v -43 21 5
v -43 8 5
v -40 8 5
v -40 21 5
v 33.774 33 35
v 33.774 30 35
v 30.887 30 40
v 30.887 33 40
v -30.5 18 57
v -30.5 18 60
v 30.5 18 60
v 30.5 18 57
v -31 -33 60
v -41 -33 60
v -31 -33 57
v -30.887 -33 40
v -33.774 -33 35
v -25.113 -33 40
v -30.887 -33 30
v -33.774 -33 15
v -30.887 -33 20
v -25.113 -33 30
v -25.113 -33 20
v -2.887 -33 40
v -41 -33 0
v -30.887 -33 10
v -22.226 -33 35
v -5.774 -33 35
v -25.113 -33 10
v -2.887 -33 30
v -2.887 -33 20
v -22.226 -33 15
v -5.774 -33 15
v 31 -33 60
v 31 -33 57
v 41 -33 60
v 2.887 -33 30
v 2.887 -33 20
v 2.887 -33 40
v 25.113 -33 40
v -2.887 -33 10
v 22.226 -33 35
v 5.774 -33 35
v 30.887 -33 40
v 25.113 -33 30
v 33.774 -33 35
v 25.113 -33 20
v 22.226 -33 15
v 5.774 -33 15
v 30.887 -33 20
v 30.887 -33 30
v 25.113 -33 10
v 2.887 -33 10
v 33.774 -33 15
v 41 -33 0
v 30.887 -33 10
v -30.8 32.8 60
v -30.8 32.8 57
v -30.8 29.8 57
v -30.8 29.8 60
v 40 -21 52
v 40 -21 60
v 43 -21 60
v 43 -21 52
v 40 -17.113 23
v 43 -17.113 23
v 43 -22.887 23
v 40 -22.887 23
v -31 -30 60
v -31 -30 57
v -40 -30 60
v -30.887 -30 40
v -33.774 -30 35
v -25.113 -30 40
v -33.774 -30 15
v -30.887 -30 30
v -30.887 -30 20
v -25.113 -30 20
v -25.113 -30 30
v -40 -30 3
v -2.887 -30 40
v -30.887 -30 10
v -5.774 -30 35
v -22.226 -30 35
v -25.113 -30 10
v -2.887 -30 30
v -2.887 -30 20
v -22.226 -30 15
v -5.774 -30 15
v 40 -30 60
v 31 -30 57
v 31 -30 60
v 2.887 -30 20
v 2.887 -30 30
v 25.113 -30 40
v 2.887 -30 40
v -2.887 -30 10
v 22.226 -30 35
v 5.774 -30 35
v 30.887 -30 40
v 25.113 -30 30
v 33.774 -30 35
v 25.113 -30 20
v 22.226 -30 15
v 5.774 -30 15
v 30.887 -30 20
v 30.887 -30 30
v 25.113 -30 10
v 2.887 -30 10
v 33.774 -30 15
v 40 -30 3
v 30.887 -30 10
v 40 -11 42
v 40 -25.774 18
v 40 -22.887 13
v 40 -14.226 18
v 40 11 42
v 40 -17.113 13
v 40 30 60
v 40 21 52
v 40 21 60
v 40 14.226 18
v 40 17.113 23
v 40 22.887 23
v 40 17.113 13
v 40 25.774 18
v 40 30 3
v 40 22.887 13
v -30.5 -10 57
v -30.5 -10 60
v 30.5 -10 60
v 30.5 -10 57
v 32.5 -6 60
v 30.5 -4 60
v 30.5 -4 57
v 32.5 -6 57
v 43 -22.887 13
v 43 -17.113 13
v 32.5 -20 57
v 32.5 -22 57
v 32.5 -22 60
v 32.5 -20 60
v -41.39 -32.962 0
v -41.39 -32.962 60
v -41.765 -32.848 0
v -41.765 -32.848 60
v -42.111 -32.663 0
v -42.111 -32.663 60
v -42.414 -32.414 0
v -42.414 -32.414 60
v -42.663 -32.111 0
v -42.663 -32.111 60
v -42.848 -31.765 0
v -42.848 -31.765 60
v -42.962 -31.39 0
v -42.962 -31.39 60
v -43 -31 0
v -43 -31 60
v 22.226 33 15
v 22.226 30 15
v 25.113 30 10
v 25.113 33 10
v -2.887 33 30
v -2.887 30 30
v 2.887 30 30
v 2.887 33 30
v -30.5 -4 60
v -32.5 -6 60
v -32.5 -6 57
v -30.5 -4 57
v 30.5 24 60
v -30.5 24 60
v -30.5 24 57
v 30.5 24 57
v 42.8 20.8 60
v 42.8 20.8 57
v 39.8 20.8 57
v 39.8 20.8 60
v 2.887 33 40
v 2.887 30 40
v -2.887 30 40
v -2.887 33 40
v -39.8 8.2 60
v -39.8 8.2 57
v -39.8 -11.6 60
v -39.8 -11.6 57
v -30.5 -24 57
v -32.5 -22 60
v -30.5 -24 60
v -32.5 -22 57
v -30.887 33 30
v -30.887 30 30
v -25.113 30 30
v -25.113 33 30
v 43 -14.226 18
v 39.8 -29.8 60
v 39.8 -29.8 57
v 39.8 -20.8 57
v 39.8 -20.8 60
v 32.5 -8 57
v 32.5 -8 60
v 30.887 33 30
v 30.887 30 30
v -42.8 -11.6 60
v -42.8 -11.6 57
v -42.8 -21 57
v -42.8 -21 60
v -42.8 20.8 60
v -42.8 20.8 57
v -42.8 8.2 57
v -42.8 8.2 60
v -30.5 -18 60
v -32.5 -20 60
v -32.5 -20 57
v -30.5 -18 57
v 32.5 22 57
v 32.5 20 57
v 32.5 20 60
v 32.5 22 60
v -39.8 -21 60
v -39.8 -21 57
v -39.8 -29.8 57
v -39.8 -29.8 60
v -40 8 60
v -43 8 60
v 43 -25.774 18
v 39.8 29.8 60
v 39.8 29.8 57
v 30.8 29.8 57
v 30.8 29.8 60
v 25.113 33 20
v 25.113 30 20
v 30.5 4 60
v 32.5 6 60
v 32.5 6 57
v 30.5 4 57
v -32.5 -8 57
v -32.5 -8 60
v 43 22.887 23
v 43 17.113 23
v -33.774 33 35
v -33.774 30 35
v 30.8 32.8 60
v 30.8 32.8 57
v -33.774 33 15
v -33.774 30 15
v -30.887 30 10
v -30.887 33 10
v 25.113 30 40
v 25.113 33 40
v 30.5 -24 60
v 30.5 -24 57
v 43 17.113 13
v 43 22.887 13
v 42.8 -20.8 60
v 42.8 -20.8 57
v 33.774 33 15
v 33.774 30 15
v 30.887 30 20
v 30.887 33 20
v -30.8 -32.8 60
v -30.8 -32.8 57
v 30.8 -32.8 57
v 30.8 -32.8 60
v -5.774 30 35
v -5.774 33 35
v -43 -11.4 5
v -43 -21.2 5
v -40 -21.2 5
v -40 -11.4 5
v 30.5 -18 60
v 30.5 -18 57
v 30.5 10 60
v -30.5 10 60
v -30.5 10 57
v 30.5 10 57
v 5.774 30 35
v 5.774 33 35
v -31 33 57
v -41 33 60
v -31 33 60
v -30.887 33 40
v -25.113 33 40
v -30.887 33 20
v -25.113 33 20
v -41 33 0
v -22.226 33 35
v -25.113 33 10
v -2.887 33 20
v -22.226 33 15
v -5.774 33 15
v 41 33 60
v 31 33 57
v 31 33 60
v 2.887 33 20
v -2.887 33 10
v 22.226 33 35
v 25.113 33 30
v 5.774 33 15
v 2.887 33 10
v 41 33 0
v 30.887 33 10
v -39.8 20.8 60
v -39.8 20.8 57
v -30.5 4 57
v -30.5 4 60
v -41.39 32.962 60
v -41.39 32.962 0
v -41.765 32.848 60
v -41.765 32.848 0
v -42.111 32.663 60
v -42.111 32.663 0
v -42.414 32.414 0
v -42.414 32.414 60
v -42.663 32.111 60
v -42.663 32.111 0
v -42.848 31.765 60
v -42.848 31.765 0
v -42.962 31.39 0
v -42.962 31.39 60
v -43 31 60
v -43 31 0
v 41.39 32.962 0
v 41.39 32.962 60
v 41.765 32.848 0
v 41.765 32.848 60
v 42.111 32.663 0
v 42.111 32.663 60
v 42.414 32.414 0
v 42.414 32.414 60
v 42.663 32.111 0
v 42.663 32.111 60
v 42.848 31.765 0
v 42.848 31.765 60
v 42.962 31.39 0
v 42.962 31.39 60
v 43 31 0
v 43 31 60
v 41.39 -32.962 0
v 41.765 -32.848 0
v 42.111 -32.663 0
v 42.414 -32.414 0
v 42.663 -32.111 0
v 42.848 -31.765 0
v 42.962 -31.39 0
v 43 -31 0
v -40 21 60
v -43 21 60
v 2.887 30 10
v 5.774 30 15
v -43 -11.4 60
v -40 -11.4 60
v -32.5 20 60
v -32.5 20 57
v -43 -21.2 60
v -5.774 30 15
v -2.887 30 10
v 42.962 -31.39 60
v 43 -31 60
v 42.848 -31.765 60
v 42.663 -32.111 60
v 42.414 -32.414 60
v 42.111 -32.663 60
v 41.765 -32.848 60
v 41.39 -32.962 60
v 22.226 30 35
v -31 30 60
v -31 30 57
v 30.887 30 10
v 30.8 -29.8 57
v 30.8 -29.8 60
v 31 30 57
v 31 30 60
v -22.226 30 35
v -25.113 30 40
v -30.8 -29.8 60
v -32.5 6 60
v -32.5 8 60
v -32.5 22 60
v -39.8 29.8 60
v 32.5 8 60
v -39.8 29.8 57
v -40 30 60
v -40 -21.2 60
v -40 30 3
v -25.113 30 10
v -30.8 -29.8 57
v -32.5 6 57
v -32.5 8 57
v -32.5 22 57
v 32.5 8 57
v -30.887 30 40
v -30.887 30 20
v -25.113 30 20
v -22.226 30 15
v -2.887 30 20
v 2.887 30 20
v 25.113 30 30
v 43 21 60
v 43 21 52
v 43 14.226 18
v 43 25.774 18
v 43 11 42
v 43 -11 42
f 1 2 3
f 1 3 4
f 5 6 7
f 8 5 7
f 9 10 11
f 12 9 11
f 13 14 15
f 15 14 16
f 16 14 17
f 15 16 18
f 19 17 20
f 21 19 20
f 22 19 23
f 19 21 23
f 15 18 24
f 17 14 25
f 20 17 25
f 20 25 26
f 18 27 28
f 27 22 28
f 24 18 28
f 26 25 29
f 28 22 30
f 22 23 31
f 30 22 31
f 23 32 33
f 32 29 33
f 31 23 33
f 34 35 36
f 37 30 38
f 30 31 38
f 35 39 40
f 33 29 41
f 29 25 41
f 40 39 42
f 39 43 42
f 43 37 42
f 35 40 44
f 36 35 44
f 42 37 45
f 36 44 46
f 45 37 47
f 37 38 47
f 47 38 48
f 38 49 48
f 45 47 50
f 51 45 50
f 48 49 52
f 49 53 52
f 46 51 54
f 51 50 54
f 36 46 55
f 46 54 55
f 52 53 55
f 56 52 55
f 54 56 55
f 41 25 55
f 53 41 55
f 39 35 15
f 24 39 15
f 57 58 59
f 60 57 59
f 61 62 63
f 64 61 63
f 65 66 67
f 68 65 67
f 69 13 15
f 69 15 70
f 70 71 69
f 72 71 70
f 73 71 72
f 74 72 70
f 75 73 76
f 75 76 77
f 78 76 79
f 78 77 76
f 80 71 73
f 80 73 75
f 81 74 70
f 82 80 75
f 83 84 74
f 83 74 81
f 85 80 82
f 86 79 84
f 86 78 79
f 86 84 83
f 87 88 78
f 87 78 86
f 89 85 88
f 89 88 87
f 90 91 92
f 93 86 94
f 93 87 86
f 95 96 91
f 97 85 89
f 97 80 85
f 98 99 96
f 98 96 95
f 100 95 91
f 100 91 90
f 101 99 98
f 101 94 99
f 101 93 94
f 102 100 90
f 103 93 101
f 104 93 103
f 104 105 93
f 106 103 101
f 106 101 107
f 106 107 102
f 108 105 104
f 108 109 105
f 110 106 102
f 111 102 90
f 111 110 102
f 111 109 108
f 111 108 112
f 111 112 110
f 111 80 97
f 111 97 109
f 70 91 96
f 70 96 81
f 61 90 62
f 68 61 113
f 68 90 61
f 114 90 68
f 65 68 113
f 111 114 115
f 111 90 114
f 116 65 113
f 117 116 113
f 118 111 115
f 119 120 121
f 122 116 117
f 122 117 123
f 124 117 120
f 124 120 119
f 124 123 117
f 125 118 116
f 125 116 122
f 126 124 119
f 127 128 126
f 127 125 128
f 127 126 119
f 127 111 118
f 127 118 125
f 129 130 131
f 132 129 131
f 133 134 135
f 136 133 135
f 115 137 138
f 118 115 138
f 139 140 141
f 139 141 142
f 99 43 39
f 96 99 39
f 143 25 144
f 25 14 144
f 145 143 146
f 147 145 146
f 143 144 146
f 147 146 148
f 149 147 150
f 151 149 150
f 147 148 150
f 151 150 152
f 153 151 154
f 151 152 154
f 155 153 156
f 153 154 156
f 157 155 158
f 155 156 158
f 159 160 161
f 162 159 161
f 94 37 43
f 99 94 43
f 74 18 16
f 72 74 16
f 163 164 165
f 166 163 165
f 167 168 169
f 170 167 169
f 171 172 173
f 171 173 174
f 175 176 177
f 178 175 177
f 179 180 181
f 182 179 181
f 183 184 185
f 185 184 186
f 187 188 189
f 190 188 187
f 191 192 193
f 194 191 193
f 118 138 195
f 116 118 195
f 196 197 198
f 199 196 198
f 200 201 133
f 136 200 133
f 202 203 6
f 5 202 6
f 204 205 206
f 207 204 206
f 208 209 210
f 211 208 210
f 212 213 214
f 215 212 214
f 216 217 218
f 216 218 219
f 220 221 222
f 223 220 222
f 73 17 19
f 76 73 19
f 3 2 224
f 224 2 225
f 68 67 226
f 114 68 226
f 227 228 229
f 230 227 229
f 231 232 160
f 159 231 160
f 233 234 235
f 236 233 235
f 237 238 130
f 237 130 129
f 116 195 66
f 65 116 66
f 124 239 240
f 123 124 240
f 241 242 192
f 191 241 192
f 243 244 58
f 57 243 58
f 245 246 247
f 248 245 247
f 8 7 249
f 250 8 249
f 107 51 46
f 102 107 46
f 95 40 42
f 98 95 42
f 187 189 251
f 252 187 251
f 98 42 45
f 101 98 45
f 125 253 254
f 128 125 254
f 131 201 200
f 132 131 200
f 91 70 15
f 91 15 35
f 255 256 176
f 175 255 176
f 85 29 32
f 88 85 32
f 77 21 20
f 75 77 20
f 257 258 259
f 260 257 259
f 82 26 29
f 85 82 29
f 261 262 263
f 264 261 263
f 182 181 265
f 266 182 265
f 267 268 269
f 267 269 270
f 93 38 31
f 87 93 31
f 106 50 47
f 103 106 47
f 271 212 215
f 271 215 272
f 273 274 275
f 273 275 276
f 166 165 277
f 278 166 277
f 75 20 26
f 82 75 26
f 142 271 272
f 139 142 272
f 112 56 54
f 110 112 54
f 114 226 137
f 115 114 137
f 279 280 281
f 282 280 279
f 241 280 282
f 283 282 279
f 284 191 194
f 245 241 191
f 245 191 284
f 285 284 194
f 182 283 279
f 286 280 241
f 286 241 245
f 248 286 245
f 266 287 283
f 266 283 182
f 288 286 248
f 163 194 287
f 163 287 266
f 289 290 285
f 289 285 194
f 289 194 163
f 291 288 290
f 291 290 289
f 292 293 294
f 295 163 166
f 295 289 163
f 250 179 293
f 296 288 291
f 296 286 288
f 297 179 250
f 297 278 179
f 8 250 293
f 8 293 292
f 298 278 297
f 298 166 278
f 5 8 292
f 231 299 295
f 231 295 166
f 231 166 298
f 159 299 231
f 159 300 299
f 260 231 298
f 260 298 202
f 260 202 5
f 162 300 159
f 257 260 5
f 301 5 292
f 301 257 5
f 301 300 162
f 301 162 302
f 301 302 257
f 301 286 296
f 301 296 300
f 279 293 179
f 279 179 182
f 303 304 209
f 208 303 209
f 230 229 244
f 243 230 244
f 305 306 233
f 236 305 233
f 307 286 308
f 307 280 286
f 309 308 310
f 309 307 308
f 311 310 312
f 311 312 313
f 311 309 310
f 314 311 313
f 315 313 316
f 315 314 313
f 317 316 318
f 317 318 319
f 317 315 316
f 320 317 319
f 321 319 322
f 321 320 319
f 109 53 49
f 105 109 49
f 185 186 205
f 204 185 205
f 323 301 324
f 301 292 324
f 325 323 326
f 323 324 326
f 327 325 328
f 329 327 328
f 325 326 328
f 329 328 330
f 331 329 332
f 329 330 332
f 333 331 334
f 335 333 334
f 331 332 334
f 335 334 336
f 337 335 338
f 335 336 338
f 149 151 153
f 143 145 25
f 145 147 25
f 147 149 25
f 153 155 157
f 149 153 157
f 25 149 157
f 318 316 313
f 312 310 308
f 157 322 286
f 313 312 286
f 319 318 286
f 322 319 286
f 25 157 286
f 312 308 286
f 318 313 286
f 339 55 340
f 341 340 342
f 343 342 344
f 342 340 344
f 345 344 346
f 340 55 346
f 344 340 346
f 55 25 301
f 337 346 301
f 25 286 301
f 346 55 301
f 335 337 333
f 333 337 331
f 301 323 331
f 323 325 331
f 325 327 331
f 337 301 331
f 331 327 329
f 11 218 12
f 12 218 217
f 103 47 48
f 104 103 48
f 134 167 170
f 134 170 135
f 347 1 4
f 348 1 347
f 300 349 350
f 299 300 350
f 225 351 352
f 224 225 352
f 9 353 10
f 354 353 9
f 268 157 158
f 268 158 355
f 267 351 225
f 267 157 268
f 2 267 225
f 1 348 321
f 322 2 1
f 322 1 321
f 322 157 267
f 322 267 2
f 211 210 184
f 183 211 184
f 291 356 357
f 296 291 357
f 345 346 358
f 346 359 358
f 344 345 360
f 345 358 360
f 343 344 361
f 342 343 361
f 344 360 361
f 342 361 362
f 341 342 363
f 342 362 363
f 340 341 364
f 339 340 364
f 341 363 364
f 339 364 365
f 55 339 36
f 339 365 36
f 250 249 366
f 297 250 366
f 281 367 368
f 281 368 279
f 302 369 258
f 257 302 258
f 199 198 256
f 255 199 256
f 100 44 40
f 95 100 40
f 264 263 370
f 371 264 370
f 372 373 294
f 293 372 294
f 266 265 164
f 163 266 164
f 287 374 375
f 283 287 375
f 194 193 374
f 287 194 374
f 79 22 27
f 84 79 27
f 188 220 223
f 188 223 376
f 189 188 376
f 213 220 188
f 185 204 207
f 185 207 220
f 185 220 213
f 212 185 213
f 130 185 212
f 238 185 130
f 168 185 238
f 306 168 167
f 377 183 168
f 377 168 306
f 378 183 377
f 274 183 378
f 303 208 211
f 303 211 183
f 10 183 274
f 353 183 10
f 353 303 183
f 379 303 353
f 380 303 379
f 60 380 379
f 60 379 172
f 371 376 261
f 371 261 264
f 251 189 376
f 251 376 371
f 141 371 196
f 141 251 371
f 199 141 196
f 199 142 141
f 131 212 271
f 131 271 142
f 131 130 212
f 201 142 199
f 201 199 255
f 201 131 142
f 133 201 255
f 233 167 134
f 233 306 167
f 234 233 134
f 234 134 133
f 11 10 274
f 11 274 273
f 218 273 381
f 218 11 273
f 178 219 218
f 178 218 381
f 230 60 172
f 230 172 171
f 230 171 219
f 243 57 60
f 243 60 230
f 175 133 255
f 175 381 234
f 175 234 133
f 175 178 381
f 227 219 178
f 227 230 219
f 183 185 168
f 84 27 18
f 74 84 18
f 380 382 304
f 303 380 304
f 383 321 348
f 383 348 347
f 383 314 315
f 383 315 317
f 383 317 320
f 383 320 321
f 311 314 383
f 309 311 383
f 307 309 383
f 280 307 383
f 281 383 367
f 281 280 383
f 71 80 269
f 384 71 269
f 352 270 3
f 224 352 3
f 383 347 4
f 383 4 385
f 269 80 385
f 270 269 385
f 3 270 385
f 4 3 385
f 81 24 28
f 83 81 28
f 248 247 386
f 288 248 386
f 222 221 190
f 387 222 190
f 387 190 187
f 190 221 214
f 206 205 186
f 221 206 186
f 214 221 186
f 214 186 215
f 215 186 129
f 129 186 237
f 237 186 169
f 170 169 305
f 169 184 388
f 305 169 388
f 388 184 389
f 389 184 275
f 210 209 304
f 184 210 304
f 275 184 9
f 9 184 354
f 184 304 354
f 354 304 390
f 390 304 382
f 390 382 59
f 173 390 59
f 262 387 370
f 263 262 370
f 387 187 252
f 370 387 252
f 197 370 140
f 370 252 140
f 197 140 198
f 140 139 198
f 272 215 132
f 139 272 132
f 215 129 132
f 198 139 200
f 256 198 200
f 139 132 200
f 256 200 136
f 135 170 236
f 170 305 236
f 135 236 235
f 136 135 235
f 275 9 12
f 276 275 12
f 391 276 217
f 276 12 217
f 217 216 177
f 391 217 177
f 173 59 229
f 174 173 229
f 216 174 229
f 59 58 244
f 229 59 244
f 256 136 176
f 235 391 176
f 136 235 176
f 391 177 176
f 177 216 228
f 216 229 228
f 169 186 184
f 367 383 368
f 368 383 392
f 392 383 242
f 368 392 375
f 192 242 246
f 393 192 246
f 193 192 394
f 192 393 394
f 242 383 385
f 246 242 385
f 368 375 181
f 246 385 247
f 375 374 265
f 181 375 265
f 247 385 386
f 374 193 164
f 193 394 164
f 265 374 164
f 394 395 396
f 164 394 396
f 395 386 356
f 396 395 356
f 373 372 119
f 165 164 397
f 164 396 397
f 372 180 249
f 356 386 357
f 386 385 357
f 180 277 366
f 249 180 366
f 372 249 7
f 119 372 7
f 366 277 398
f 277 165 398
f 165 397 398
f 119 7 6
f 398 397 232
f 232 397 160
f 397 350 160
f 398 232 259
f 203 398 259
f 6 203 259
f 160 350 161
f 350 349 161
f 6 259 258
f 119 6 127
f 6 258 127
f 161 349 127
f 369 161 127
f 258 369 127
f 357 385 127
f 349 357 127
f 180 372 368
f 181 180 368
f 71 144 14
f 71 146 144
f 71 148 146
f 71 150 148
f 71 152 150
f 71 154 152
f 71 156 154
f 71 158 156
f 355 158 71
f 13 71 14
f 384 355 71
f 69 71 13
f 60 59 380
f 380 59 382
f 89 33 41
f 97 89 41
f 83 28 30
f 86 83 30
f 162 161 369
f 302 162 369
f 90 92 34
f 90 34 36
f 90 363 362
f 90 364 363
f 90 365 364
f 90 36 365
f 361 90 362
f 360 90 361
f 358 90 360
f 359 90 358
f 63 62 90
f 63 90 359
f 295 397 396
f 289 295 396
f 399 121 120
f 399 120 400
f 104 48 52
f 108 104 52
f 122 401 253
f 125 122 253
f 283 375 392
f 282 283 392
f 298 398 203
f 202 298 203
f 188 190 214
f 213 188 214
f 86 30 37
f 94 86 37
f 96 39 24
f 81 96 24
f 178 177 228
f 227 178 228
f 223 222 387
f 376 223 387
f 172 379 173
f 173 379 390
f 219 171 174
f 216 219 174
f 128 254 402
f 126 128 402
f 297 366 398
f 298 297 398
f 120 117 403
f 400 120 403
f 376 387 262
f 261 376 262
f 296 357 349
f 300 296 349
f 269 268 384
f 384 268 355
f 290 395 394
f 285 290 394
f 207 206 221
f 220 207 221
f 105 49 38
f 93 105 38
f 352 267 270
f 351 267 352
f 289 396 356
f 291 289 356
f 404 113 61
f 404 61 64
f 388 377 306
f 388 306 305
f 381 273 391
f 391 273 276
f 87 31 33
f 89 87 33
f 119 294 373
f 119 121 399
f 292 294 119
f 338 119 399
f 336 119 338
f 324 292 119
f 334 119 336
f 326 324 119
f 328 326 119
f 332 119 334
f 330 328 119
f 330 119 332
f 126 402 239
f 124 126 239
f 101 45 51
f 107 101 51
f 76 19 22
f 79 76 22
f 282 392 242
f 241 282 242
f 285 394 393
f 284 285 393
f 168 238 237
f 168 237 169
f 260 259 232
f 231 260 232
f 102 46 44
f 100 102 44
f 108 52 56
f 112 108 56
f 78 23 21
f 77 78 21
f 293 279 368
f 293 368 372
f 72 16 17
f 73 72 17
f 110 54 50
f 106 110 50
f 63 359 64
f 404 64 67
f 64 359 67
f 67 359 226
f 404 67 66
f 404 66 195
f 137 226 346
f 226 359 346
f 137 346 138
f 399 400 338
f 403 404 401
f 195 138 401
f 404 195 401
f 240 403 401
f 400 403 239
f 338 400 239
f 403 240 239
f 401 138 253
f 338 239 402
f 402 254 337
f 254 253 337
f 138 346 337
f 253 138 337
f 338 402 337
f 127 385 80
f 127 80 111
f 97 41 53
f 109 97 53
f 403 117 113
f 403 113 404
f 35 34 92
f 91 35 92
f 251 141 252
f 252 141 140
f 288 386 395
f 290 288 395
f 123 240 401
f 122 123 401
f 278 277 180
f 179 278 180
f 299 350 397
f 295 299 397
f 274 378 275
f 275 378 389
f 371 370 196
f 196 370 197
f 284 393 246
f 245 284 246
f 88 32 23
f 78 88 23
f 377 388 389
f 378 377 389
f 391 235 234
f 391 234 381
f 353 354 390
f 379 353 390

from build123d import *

# Parameters (mm, degrees)
SKETCH1_W           = 86
SKETCH1_H           = 66
SKETCH1_W_2         = 80
SKETCH1_H_2         = 60
BOSS_EXTRUDE1_DEPTH = 60
SKETCH1_2_W         = 80
SKETCH1_2_H         = 60
BOSS_EXTRUDE2_DEPTH = 3
CUT_EXTRUDE1_REACH  = 88
SKETCH2_W           = 55
SKETCH2_H           = 9.8
SKETCH2_H_2         = 13
CUT_EXTRUDE2_DEPTH  = 67
CUT_EXTRUDE3_REACH  = 88
SKETCH5_W           = 62
SKETCH5_H           = 3
SKETCH5_W_2         = 3
SKETCH5_H_2         = 42
CUT_EXTRUDE4_DEPTH  = 3
SKETCH6_W           = 2.8
SKETCH6_H           = 41.6
BOSS_EXTRUDE3_DEPTH = 3
SKETCH7_W           = 65
SKETCH7_H           = 6
CUT_EXTRUDE5_DEPTH  = 3
SKETCH8_W           = 3
SKETCH8_H           = 42
CUT_EXTRUDE6_DEPTH  = 15
CHAMFER1_SIZE       = 2
FILLET1_R           = 2
CHAMFER2_SIZE       = 10


with BuildPart() as part:
    # Sketch1 → Boss-Extrude1 (new body)
    with BuildSketch(Plane.XY):
        Rectangle(SKETCH1_W, SKETCH1_H)
        Rectangle(SKETCH1_W_2, SKETCH1_H_2, mode=Mode.SUBTRACT)
    extrude(amount=BOSS_EXTRUDE1_DEPTH)

    # Sketch1<2> → Boss-Extrude2 (add)
    with BuildSketch(Plane.XY):
        Rectangle(SKETCH1_2_W, SKETCH1_2_H)
    extrude(amount=BOSS_EXTRUDE2_DEPTH)

    # Sketch2 → Cut-Extrude1 (cut, up to next)
    with BuildSketch(Plane.ZY.offset(43), mode=Mode.PRIVATE) as cut_extrude1_sk1:
        with Locations((32.5, -16.3)):
            Rectangle(SKETCH2_W, SKETCH2_H)
    cut_extrude1_tool1 = extrude(cut_extrude1_sk1.sketch, amount=-CUT_EXTRUDE1_REACH, mode=Mode.PRIVATE) & part.part
    add(cut_extrude1_tool1.solids().sort_by_distance((-43, -16.3, 32.5))[0], mode=Mode.SUBTRACT)
    # Sketch2 → Cut-Extrude1 (cut, up to next)
    with BuildSketch(Plane.ZY.offset(43), mode=Mode.PRIVATE) as cut_extrude1_sk2:
        with Locations((32.5, 14.5)):
            Rectangle(SKETCH2_W, SKETCH2_H_2)
    cut_extrude1_tool2 = extrude(cut_extrude1_sk2.sketch, amount=-CUT_EXTRUDE1_REACH, mode=Mode.PRIVATE) & part.part
    add(cut_extrude1_tool2.solids().sort_by_distance((-43, 14.5, 32.5))[0], mode=Mode.SUBTRACT)

    # Sketch3 → Cut-Extrude2 (cut, through all)
    with BuildSketch(Plane.XZ.offset(33)):
        Polygon((-25.113248654, 40), (-30.886751346, 40), (-33.773502692, 35), (-30.886751346, 30), (-25.113248654, 30), (-22.226497308, 35), align=None)
        Polygon((2.886751346, 40), (-2.886751346, 40), (-5.773502692, 35), (-2.886751346, 30), (2.886751346, 30), (5.773502692, 35), align=None)
        Polygon((30.886751346, 40), (25.113248654, 40), (22.226497308, 35), (25.113248654, 30), (30.886751346, 30), (33.773502692, 35), align=None)
        Polygon((30.886751346, 20), (25.113248654, 20), (22.226497308, 15), (25.113248654, 10), (30.886751346, 10), (33.773502692, 15), align=None)
        Polygon((2.886751346, 20), (-2.886751346, 20), (-5.773502692, 15), (-2.886751346, 10), (2.886751346, 10), (5.773502692, 15), align=None)
        Polygon((-25.113248654, 20), (-30.886751346, 20), (-33.773502692, 15), (-30.886751346, 10), (-25.113248654, 10), (-22.226497308, 15), align=None)
    extrude(amount=-CUT_EXTRUDE2_DEPTH, mode=Mode.SUBTRACT)

    # Sketch4 → Cut-Extrude3 (cut, up to next)
    with BuildSketch(Plane(origin=(43, 0, 0), x_dir=(0, 0, -1), z_dir=(1, 0, 0)), mode=Mode.PRIVATE) as cut_extrude3_sk1:
        Polygon((-18, 25.773502692), (-23, 22.886751346), (-23, 17.113248654), (-18, 14.226497308), (-13, 17.113248654), (-13, 22.886751346), align=None)
    cut_extrude3_tool1 = extrude(cut_extrude3_sk1.sketch, amount=-CUT_EXTRUDE3_REACH, mode=Mode.PRIVATE) & part.part
    add(cut_extrude3_tool1.solids().sort_by_distance((43, 20, 18))[0], mode=Mode.SUBTRACT)
    # Sketch4 → Cut-Extrude3 (cut, up to next)
    with BuildSketch(Plane(origin=(43, 0, 0), x_dir=(0, 0, -1), z_dir=(1, 0, 0)), mode=Mode.PRIVATE) as cut_extrude3_sk2:
        Polygon((-18, -14.226497308), (-23, -17.113248654), (-23, -22.886751346), (-18, -25.773502692), (-13, -22.886751346), (-13, -17.113248654), align=None)
    cut_extrude3_tool2 = extrude(cut_extrude3_sk2.sketch, amount=-CUT_EXTRUDE3_REACH, mode=Mode.PRIVATE) & part.part
    add(cut_extrude3_tool2.solids().sort_by_distance((43, -20, 18))[0], mode=Mode.SUBTRACT)

    # Sketch5 → Cut-Extrude4 (cut)
    with BuildSketch(Plane.XY.offset(60)):
        with Locations((0, 31.5)):
            Rectangle(SKETCH5_W, SKETCH5_H)
        with Locations((0, -31.5)):
            Rectangle(SKETCH5_W, SKETCH5_H)
        with Locations((41.5, 0)):
            Rectangle(SKETCH5_W_2, SKETCH5_H_2)
    extrude(amount=-CUT_EXTRUDE4_DEPTH, mode=Mode.SUBTRACT)

    # Sketch8 → Cut-Extrude6 (cut)
    with BuildSketch(Plane.XY.offset(57)):
        with Locations((41.5, 0)):
            Rectangle(SKETCH8_W, SKETCH8_H)
    extrude(amount=-CUT_EXTRUDE6_DEPTH, mode=Mode.SUBTRACT)

    # Fillet1
    fillet1_edges = [part.edges().sort_by_distance(p)[0] for p in [
        (-43, -33, 30),
        (-43, 33, 30),
        (43, 33, 30),
        (43, -33, 30),
    ]]
    fillet(fillet1_edges, radius=FILLET1_R)

    # Chamfer2
    chamfer2_edges = [part.edges().sort_by_distance(p)[0] for p in [
        (41.5, 21, 42),
        (41.5, -21, 42),
    ]]
    chamfer(chamfer2_edges, length=CHAMFER2_SIZE)


with BuildPart() as body_2:
    # Sketch6 → Boss-Extrude3 (new body)
    with BuildSketch(Plane.XY.offset(57)):
        Polygon((40, -20.8), (40, 20.8), (39.8, 20.8), (39.8, 29.8), (30.8, 29.8), (30.8, 32.8), (-30.8, 32.8), (-30.8, 29.8), (-39.8, 29.8), (-39.8, 20.8), (-42.8, 20.8), (-42.8, 8.2), (-39.8, 8.2), (-39.8, -11.6), (-42.8, -11.6), (-42.8, -21), (-39.8, -21), (-39.8, -29.8), (-30.8, -29.8), (-30.8, -32.8), (30.8, -32.8), (30.8, -29.8), (39.8, -29.8), (39.8, -20.8), align=None)
        with Locations((41.4, 0)):
            Rectangle(SKETCH6_W, SKETCH6_H)
    extrude(amount=BOSS_EXTRUDE3_DEPTH)

    # Sketch7 → Cut-Extrude5 (cut)
    with BuildSketch(Plane.XY.offset(60)):
        with Locations((0, 21)):
            Rectangle(SKETCH7_W, SKETCH7_H)
        with Locations((0, 7)):
            Rectangle(SKETCH7_W, SKETCH7_H)
        with Locations((0, -7)):
            Rectangle(SKETCH7_W, SKETCH7_H)
        with Locations((0, -21)):
            Rectangle(SKETCH7_W, SKETCH7_H)
    extrude(amount=-CUT_EXTRUDE5_DEPTH, mode=Mode.SUBTRACT)

    # Chamfer1
    chamfer1_edges = [body_2.edges().sort_by_distance(p)[0] for p in [
        (-32.5, -10, 58.5),
        (-32.5, -4, 58.5),
        (32.5, -4, 58.5),
        (32.5, -10, 58.5),
        (-32.5, -24, 58.5),
        (-32.5, -18, 58.5),
        (32.5, -18, 58.5),
        (32.5, -24, 58.5),
        (-32.5, 18, 58.5),
        (-32.5, 24, 58.5),
        (32.5, 24, 58.5),
        (32.5, 18, 58.5),
        (-32.5, 4, 58.5),
        (-32.5, 10, 58.5),
        (32.5, 10, 58.5),
        (32.5, 4, 58.5),
    ]]
    chamfer(chamfer1_edges, length=CHAMFER1_SIZE)


solid = Compound([part.part, body_2.part])
